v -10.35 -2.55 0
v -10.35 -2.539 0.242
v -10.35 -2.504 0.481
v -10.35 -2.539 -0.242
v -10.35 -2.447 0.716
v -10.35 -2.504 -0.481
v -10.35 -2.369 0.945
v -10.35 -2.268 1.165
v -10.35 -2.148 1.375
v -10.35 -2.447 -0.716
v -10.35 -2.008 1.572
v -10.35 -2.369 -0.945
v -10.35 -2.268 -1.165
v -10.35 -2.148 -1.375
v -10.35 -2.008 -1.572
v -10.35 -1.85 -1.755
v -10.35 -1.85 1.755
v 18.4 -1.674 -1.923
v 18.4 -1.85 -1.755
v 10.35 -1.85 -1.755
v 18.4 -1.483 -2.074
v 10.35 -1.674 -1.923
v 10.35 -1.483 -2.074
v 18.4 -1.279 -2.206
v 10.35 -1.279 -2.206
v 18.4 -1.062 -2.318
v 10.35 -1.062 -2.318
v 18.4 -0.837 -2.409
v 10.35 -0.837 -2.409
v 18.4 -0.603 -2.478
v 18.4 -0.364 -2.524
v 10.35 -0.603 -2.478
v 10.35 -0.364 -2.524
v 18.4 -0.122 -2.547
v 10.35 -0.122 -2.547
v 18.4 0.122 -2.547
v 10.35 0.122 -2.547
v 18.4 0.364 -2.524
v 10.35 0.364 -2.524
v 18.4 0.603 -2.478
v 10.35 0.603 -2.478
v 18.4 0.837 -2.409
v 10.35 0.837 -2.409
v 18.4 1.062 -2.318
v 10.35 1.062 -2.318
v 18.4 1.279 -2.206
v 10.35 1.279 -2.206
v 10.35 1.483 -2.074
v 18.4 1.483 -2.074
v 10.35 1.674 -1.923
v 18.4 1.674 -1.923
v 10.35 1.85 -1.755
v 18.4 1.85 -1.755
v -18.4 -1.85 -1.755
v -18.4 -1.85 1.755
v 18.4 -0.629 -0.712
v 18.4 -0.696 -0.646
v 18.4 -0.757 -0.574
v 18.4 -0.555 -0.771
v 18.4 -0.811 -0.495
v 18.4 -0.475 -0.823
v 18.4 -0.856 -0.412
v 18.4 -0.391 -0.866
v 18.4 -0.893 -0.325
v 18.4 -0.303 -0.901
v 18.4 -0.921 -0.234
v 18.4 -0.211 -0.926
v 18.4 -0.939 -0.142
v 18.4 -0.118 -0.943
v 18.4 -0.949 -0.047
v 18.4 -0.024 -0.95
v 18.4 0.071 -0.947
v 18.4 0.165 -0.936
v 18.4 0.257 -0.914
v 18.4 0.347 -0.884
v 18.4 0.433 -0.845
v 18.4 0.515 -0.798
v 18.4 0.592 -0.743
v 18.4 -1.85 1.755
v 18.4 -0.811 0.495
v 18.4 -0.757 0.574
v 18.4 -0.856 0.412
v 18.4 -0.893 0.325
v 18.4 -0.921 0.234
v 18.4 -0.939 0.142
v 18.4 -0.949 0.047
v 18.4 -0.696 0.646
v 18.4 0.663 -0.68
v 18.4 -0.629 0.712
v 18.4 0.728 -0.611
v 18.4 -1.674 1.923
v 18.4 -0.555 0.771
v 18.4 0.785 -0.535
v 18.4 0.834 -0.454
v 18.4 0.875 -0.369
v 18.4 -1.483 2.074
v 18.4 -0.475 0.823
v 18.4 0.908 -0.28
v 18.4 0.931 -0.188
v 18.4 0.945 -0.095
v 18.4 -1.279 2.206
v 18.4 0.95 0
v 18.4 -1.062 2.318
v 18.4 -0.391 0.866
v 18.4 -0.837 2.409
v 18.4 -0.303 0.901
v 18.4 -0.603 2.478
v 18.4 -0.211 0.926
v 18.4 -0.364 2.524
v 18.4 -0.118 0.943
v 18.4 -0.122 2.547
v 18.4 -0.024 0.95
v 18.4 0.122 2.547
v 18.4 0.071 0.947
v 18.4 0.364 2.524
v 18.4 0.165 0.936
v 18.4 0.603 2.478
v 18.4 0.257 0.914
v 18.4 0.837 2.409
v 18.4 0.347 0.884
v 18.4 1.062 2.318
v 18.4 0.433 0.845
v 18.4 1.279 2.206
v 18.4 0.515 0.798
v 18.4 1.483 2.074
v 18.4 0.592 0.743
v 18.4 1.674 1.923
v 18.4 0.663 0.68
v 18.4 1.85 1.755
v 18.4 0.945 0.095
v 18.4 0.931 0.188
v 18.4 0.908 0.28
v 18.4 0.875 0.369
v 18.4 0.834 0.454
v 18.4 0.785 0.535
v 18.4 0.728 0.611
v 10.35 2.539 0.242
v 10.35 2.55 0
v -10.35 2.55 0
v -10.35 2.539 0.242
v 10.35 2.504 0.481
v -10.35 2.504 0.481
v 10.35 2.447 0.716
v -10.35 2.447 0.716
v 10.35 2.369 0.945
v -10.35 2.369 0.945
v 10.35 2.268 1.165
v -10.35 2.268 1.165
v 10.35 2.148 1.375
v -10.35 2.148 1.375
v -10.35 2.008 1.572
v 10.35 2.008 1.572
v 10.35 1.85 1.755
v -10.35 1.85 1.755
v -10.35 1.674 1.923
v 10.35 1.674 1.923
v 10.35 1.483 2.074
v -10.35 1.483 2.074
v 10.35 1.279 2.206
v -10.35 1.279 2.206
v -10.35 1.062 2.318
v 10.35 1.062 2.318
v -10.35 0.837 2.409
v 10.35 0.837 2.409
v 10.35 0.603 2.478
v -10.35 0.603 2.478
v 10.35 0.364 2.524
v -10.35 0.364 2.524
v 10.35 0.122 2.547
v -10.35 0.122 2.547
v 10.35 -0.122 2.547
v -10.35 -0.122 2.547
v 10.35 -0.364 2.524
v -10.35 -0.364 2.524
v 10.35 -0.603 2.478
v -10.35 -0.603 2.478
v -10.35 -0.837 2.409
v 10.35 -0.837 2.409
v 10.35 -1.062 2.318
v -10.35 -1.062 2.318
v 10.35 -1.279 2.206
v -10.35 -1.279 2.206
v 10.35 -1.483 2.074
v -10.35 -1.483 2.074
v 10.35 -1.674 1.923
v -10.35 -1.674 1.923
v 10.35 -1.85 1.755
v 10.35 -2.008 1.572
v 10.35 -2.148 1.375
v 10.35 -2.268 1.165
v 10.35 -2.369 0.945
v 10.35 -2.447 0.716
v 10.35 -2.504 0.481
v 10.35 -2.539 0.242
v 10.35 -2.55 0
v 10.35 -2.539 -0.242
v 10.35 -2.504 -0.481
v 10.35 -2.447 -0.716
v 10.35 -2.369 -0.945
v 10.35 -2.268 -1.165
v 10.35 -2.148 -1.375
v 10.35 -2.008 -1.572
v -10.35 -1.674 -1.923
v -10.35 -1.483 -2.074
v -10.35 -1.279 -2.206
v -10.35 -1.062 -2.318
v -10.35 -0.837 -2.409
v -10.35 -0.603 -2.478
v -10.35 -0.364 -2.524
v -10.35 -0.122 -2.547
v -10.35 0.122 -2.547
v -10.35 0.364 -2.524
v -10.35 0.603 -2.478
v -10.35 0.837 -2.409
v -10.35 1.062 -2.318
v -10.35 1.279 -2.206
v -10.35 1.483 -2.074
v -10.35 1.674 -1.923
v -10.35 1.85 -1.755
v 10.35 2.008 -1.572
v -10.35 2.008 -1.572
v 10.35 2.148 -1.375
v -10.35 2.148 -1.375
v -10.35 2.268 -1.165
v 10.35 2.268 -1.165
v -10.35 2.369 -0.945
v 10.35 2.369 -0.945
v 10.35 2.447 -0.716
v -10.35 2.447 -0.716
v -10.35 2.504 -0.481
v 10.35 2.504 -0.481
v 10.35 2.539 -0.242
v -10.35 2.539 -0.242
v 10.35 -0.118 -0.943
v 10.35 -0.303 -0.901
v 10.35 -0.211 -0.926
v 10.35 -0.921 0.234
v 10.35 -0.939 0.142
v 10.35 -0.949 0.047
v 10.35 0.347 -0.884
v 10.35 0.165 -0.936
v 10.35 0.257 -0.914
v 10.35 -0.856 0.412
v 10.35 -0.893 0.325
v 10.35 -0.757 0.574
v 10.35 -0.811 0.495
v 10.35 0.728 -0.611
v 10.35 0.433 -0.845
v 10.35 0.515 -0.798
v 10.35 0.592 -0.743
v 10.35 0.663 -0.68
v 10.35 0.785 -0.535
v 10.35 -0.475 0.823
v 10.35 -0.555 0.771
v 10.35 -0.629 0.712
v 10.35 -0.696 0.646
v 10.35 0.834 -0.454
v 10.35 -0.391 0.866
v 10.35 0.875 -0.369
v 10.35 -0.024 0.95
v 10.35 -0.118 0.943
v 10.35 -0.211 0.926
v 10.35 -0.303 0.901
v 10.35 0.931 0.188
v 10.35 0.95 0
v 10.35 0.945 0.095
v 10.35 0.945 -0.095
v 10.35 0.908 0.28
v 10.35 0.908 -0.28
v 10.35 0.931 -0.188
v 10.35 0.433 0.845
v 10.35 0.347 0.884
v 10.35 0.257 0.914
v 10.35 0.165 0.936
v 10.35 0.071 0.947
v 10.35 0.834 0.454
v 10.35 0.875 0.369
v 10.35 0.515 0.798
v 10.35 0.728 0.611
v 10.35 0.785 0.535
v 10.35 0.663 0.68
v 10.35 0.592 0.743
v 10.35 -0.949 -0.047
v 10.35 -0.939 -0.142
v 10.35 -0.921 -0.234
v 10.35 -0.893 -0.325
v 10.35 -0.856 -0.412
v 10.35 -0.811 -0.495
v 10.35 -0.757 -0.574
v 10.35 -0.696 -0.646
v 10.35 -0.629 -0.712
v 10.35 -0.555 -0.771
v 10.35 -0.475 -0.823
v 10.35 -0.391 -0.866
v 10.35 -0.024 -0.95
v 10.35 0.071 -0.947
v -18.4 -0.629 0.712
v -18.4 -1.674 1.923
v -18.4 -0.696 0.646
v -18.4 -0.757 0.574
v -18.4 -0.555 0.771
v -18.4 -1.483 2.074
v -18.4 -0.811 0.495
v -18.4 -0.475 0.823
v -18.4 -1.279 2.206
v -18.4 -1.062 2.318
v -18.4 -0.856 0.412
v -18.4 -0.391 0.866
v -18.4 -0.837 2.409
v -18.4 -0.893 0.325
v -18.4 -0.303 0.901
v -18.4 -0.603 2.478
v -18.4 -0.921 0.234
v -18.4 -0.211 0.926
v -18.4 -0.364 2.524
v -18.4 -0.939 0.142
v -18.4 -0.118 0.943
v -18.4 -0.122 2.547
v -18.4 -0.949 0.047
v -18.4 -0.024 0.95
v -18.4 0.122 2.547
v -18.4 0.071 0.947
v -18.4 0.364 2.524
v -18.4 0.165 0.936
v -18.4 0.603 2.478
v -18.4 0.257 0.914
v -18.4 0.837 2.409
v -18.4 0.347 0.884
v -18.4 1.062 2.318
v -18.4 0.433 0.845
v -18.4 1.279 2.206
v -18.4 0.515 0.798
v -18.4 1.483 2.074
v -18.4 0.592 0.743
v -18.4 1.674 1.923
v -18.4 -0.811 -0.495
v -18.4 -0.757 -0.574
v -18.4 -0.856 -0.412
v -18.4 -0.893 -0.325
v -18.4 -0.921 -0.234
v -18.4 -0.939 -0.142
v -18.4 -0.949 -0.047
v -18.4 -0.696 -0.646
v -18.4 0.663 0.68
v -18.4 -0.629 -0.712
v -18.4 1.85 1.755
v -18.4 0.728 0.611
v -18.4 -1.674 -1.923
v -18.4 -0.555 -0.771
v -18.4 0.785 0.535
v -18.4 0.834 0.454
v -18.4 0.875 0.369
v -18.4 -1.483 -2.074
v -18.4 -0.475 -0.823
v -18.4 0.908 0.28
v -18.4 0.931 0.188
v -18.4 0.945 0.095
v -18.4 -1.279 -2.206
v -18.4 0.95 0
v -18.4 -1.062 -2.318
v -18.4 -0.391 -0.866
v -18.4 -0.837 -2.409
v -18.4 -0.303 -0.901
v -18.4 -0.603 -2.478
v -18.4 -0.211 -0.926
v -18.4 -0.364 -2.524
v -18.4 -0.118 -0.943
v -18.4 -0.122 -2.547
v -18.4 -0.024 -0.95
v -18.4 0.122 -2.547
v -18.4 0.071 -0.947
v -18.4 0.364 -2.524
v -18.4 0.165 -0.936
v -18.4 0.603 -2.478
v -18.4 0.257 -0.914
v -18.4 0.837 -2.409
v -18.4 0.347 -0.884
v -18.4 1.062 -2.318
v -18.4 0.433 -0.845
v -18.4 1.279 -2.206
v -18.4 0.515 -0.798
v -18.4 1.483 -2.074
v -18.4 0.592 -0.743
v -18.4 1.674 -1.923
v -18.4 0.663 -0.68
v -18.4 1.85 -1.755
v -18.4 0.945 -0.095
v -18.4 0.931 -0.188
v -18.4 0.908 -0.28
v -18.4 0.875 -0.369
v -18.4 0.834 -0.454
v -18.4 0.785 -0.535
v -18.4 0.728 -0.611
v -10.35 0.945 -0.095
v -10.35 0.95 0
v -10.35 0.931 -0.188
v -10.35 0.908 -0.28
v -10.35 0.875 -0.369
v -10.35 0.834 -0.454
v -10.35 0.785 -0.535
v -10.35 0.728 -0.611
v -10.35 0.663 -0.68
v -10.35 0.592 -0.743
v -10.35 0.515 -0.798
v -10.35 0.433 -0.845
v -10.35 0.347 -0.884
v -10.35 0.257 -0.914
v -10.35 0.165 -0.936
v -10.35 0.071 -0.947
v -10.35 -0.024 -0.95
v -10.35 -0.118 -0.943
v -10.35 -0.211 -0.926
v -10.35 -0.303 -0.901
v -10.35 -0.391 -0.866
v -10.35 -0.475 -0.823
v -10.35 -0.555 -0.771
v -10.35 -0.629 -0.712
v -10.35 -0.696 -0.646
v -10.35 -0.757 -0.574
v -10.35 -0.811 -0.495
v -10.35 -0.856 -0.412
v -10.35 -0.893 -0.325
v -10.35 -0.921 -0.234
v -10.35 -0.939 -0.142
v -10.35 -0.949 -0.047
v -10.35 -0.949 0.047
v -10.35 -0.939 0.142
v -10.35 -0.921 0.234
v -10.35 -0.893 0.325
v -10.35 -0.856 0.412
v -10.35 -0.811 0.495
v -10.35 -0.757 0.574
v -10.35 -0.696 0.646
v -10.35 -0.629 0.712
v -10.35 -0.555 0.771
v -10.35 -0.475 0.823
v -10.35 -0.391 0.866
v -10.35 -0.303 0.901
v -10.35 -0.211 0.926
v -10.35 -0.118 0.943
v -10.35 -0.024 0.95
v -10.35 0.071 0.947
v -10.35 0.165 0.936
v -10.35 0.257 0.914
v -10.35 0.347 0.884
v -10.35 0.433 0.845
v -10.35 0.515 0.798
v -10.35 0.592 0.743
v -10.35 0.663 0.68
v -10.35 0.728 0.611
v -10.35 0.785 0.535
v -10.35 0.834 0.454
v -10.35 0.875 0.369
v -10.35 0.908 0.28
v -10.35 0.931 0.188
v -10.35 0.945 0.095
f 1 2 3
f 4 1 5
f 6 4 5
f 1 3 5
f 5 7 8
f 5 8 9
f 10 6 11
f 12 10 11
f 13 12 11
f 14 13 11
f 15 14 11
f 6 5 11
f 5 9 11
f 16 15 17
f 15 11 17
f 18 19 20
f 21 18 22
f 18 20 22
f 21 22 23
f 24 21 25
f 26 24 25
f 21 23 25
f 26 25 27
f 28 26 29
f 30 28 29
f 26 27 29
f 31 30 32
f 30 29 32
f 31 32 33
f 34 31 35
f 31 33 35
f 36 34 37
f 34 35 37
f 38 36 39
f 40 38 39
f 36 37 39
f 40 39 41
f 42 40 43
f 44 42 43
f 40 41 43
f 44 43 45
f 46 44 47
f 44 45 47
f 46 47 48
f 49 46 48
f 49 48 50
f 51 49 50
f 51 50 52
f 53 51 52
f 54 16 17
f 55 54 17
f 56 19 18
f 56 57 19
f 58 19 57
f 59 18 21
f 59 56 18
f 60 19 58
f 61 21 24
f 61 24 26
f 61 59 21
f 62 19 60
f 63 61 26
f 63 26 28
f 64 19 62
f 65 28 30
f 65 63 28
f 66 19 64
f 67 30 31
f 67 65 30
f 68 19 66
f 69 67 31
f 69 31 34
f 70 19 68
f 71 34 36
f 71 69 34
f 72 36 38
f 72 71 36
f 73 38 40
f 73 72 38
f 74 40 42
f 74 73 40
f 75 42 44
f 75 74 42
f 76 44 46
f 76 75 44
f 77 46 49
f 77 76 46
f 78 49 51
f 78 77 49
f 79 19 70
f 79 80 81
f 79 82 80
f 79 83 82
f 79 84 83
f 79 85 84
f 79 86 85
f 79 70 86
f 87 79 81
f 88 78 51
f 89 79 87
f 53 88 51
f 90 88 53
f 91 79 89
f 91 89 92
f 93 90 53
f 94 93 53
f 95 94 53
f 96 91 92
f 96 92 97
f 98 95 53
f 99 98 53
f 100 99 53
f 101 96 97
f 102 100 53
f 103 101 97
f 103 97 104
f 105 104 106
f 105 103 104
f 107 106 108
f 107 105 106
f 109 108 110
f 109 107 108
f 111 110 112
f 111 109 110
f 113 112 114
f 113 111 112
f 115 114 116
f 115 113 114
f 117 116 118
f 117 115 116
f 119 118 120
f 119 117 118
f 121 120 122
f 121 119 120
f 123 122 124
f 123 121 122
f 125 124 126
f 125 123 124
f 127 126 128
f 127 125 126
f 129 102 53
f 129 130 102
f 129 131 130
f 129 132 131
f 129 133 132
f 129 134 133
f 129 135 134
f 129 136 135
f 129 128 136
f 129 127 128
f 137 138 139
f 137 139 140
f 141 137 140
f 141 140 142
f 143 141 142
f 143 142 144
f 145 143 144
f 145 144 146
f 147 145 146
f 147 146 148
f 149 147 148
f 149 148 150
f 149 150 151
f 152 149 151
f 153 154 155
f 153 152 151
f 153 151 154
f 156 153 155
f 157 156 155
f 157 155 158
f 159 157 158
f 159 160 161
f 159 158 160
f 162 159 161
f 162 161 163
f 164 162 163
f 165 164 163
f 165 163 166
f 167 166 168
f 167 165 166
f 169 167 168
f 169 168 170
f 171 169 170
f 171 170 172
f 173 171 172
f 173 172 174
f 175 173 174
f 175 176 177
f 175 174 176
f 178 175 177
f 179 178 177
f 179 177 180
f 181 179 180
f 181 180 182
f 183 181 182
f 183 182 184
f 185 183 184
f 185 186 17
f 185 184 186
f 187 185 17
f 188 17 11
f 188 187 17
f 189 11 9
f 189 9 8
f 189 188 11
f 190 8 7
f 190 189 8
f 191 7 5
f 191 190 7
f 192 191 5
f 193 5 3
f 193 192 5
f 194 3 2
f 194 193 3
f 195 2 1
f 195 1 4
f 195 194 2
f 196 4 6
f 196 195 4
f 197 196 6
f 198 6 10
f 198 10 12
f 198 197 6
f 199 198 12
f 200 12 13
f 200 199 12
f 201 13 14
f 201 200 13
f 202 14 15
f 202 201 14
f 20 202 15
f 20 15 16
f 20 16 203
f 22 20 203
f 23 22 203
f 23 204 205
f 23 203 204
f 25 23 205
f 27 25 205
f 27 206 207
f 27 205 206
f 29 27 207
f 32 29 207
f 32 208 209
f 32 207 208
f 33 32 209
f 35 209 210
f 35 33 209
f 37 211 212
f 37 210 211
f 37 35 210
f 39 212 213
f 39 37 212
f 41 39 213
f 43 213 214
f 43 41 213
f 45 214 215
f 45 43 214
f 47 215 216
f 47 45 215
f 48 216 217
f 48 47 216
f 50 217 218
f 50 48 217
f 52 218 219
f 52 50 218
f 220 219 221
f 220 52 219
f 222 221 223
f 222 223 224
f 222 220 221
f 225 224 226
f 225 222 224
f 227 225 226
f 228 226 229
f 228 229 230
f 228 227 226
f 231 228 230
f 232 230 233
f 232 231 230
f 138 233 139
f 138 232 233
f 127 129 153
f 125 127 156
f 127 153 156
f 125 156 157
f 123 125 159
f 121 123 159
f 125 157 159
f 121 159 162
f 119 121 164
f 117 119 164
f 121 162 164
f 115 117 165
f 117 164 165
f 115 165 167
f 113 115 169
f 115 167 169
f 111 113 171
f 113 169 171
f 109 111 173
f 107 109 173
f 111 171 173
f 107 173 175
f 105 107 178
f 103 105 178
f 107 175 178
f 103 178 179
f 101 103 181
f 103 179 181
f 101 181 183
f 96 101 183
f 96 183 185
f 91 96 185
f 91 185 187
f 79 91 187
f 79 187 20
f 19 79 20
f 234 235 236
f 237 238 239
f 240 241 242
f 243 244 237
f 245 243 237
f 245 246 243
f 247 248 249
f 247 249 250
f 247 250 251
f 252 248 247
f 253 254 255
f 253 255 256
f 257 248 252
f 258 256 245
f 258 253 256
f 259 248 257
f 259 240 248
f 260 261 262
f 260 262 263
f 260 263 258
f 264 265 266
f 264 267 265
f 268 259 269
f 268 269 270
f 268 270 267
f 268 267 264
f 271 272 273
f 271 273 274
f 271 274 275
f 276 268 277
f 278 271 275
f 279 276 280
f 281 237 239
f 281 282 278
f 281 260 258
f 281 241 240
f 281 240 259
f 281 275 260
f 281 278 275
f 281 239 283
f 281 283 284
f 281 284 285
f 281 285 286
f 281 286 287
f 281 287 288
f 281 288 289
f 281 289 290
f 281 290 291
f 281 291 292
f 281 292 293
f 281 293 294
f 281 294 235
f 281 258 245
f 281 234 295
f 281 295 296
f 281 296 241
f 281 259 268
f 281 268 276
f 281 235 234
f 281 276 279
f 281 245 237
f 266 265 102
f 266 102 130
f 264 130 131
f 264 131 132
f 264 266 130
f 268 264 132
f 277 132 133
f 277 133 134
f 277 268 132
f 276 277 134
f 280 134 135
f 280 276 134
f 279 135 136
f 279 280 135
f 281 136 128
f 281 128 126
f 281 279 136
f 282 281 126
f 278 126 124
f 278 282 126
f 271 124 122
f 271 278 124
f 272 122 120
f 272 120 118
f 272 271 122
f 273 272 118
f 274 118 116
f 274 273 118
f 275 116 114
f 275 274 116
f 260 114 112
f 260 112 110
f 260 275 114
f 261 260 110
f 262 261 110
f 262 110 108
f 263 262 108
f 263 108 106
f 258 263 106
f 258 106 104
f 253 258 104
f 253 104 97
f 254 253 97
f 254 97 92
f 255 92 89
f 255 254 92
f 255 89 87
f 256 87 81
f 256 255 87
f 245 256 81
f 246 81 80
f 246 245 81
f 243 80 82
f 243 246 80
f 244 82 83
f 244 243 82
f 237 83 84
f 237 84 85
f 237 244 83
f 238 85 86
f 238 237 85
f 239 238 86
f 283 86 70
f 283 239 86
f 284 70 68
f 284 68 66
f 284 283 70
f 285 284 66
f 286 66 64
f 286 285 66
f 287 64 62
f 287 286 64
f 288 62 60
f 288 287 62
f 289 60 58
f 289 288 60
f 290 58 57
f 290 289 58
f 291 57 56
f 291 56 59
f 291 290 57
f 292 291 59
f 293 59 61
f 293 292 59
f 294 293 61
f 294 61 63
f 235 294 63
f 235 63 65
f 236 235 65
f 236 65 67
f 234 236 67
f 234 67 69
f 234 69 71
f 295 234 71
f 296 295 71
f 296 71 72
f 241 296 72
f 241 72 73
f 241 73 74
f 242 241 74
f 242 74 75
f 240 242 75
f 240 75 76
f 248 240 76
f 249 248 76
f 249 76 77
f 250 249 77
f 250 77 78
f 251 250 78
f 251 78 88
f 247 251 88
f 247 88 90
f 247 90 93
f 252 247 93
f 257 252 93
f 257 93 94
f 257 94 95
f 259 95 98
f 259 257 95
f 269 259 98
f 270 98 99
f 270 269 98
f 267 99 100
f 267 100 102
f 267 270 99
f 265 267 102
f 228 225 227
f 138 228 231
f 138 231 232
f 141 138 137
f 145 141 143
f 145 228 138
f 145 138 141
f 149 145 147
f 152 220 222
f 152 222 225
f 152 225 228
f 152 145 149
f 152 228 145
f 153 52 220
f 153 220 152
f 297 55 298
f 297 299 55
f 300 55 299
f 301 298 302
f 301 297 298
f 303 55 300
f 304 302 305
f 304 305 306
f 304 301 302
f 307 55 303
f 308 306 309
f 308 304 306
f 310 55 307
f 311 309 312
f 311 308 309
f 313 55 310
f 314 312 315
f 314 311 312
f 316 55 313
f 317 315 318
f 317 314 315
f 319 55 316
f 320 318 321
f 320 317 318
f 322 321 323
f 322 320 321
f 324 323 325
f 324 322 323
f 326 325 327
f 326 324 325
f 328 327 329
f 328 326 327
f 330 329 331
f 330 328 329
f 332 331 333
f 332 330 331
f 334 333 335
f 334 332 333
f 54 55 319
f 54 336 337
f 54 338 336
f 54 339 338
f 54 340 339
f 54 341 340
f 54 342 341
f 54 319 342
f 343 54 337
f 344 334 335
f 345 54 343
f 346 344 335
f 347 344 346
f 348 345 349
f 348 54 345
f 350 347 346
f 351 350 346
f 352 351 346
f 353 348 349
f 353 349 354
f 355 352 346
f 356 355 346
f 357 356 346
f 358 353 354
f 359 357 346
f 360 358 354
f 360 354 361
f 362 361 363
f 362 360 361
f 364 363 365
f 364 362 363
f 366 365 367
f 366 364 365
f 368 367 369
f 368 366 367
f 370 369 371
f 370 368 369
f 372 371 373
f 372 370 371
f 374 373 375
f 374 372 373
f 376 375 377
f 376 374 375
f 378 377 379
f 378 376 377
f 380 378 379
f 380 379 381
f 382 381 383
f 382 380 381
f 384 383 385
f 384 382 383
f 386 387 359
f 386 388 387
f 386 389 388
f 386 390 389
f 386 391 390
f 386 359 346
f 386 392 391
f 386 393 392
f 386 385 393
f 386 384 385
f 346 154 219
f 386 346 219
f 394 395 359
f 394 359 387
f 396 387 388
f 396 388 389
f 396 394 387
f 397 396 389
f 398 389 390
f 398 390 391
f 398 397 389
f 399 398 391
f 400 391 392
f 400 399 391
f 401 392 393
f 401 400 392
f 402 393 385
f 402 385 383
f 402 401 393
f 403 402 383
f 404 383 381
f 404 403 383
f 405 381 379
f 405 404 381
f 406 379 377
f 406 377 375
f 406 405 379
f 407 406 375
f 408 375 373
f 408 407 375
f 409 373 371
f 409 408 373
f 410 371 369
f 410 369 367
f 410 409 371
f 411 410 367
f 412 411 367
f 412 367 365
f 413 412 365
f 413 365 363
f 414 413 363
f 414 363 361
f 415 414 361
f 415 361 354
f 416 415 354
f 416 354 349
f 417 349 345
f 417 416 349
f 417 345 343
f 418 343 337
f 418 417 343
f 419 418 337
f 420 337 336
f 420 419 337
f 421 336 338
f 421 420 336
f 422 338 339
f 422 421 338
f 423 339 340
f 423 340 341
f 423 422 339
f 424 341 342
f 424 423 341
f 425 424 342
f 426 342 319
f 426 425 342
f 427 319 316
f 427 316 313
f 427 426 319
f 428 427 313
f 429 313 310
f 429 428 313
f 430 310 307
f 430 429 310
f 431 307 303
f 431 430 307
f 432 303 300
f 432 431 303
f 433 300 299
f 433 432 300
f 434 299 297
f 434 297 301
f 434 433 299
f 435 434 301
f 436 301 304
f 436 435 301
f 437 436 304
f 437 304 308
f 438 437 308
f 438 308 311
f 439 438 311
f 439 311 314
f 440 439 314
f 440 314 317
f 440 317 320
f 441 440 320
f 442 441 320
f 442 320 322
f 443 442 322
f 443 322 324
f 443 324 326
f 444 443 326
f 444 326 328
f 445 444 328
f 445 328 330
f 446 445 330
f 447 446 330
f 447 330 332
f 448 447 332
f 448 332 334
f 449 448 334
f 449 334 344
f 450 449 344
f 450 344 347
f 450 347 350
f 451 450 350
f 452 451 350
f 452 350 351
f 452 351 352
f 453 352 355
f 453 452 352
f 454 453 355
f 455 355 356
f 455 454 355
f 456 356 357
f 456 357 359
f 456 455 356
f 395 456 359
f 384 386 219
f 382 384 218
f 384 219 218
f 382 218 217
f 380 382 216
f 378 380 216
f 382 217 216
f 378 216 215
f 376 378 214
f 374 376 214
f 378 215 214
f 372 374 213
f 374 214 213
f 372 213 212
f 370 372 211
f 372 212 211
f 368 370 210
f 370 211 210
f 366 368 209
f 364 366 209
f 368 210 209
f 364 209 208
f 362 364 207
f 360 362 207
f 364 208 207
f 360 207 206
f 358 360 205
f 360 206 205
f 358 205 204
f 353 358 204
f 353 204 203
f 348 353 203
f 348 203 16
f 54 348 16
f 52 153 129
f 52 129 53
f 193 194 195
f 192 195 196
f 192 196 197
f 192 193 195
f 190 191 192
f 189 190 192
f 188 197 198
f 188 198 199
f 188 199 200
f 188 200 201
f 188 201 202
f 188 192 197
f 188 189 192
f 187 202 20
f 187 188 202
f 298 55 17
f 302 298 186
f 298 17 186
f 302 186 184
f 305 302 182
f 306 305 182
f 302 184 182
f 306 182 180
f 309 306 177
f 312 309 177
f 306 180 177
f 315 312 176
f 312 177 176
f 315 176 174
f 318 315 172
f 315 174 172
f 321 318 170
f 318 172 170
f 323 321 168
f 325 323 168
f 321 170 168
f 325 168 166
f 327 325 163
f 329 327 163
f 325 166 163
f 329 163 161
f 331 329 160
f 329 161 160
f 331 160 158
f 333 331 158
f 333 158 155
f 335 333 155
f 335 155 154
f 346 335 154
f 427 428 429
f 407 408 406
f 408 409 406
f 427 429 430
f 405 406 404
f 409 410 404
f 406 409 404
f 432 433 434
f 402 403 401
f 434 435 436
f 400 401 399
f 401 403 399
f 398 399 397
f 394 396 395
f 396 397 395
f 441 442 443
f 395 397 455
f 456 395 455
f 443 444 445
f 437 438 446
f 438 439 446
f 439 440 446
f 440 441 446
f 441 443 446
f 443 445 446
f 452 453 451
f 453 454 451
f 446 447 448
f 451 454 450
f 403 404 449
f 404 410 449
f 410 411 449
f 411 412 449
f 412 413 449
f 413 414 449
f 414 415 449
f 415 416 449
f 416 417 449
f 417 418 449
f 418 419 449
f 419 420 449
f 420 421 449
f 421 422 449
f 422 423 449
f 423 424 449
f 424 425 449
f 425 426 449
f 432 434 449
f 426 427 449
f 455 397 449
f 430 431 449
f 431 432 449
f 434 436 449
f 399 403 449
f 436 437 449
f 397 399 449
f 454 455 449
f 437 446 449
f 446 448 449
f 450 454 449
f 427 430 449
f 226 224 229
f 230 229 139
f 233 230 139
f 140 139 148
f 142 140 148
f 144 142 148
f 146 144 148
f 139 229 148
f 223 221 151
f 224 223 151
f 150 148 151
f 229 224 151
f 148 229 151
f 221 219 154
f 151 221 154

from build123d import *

# Parameters (mm, degrees)
SKETCH037_R  = 2.55
PAD031_DEPTH = 10.35
SKETCH038_R  = 0.95
PAD032_DEPTH = 8.05
SKETCH053_R  = 0.95
PAD045_DEPTH = 8.05


with BuildPart() as part:
    # Sketch037 → Pad031 (new body, symmetric)
    with BuildSketch(Plane.YZ):
        Circle(SKETCH037_R)
    extrude(amount=PAD031_DEPTH, both=True)

    # Sketch038 (on Face3 of Pad031) → Pad032 (join)
    with BuildSketch(Plane.YZ.offset(10.35)):
        with BuildLine():
            ThreePointArc((1.85, 1.754993), (0, 2.55), (-1.85, 1.754993))
            Line((-1.85, 1.754993), (-1.85, -1.754993))
            ThreePointArc((-1.85, -1.754993), (0, -2.55), (1.85, -1.754993))
            Line((1.85, 1.754993), (1.85, -1.754993))
        make_face()
        Circle(SKETCH038_R, mode=Mode.SUBTRACT)
    extrude(amount=PAD032_DEPTH)

    # Sketch053 (on Face9 of Pad032) → Pad045 (join)
    with BuildSketch(Plane(origin=(-10.35, 0, 0), x_dir=(0, 1, 0), z_dir=(-1, 0, 0))):
        with BuildLine():
            Line((-1.85, 1.754993), (-1.85, -1.754993))
            ThreePointArc((-1.85, -1.754993), (0, -2.55), (1.85, -1.754993))
            Line((1.85, -1.754993), (1.85, 1.754993))
            ThreePointArc((1.85, 1.754993), (0, 2.55), (-1.85, 1.754993))
        make_face()
        Circle(SKETCH053_R, mode=Mode.SUBTRACT)
    extrude(amount=PAD045_DEPTH)


solid = part.part
